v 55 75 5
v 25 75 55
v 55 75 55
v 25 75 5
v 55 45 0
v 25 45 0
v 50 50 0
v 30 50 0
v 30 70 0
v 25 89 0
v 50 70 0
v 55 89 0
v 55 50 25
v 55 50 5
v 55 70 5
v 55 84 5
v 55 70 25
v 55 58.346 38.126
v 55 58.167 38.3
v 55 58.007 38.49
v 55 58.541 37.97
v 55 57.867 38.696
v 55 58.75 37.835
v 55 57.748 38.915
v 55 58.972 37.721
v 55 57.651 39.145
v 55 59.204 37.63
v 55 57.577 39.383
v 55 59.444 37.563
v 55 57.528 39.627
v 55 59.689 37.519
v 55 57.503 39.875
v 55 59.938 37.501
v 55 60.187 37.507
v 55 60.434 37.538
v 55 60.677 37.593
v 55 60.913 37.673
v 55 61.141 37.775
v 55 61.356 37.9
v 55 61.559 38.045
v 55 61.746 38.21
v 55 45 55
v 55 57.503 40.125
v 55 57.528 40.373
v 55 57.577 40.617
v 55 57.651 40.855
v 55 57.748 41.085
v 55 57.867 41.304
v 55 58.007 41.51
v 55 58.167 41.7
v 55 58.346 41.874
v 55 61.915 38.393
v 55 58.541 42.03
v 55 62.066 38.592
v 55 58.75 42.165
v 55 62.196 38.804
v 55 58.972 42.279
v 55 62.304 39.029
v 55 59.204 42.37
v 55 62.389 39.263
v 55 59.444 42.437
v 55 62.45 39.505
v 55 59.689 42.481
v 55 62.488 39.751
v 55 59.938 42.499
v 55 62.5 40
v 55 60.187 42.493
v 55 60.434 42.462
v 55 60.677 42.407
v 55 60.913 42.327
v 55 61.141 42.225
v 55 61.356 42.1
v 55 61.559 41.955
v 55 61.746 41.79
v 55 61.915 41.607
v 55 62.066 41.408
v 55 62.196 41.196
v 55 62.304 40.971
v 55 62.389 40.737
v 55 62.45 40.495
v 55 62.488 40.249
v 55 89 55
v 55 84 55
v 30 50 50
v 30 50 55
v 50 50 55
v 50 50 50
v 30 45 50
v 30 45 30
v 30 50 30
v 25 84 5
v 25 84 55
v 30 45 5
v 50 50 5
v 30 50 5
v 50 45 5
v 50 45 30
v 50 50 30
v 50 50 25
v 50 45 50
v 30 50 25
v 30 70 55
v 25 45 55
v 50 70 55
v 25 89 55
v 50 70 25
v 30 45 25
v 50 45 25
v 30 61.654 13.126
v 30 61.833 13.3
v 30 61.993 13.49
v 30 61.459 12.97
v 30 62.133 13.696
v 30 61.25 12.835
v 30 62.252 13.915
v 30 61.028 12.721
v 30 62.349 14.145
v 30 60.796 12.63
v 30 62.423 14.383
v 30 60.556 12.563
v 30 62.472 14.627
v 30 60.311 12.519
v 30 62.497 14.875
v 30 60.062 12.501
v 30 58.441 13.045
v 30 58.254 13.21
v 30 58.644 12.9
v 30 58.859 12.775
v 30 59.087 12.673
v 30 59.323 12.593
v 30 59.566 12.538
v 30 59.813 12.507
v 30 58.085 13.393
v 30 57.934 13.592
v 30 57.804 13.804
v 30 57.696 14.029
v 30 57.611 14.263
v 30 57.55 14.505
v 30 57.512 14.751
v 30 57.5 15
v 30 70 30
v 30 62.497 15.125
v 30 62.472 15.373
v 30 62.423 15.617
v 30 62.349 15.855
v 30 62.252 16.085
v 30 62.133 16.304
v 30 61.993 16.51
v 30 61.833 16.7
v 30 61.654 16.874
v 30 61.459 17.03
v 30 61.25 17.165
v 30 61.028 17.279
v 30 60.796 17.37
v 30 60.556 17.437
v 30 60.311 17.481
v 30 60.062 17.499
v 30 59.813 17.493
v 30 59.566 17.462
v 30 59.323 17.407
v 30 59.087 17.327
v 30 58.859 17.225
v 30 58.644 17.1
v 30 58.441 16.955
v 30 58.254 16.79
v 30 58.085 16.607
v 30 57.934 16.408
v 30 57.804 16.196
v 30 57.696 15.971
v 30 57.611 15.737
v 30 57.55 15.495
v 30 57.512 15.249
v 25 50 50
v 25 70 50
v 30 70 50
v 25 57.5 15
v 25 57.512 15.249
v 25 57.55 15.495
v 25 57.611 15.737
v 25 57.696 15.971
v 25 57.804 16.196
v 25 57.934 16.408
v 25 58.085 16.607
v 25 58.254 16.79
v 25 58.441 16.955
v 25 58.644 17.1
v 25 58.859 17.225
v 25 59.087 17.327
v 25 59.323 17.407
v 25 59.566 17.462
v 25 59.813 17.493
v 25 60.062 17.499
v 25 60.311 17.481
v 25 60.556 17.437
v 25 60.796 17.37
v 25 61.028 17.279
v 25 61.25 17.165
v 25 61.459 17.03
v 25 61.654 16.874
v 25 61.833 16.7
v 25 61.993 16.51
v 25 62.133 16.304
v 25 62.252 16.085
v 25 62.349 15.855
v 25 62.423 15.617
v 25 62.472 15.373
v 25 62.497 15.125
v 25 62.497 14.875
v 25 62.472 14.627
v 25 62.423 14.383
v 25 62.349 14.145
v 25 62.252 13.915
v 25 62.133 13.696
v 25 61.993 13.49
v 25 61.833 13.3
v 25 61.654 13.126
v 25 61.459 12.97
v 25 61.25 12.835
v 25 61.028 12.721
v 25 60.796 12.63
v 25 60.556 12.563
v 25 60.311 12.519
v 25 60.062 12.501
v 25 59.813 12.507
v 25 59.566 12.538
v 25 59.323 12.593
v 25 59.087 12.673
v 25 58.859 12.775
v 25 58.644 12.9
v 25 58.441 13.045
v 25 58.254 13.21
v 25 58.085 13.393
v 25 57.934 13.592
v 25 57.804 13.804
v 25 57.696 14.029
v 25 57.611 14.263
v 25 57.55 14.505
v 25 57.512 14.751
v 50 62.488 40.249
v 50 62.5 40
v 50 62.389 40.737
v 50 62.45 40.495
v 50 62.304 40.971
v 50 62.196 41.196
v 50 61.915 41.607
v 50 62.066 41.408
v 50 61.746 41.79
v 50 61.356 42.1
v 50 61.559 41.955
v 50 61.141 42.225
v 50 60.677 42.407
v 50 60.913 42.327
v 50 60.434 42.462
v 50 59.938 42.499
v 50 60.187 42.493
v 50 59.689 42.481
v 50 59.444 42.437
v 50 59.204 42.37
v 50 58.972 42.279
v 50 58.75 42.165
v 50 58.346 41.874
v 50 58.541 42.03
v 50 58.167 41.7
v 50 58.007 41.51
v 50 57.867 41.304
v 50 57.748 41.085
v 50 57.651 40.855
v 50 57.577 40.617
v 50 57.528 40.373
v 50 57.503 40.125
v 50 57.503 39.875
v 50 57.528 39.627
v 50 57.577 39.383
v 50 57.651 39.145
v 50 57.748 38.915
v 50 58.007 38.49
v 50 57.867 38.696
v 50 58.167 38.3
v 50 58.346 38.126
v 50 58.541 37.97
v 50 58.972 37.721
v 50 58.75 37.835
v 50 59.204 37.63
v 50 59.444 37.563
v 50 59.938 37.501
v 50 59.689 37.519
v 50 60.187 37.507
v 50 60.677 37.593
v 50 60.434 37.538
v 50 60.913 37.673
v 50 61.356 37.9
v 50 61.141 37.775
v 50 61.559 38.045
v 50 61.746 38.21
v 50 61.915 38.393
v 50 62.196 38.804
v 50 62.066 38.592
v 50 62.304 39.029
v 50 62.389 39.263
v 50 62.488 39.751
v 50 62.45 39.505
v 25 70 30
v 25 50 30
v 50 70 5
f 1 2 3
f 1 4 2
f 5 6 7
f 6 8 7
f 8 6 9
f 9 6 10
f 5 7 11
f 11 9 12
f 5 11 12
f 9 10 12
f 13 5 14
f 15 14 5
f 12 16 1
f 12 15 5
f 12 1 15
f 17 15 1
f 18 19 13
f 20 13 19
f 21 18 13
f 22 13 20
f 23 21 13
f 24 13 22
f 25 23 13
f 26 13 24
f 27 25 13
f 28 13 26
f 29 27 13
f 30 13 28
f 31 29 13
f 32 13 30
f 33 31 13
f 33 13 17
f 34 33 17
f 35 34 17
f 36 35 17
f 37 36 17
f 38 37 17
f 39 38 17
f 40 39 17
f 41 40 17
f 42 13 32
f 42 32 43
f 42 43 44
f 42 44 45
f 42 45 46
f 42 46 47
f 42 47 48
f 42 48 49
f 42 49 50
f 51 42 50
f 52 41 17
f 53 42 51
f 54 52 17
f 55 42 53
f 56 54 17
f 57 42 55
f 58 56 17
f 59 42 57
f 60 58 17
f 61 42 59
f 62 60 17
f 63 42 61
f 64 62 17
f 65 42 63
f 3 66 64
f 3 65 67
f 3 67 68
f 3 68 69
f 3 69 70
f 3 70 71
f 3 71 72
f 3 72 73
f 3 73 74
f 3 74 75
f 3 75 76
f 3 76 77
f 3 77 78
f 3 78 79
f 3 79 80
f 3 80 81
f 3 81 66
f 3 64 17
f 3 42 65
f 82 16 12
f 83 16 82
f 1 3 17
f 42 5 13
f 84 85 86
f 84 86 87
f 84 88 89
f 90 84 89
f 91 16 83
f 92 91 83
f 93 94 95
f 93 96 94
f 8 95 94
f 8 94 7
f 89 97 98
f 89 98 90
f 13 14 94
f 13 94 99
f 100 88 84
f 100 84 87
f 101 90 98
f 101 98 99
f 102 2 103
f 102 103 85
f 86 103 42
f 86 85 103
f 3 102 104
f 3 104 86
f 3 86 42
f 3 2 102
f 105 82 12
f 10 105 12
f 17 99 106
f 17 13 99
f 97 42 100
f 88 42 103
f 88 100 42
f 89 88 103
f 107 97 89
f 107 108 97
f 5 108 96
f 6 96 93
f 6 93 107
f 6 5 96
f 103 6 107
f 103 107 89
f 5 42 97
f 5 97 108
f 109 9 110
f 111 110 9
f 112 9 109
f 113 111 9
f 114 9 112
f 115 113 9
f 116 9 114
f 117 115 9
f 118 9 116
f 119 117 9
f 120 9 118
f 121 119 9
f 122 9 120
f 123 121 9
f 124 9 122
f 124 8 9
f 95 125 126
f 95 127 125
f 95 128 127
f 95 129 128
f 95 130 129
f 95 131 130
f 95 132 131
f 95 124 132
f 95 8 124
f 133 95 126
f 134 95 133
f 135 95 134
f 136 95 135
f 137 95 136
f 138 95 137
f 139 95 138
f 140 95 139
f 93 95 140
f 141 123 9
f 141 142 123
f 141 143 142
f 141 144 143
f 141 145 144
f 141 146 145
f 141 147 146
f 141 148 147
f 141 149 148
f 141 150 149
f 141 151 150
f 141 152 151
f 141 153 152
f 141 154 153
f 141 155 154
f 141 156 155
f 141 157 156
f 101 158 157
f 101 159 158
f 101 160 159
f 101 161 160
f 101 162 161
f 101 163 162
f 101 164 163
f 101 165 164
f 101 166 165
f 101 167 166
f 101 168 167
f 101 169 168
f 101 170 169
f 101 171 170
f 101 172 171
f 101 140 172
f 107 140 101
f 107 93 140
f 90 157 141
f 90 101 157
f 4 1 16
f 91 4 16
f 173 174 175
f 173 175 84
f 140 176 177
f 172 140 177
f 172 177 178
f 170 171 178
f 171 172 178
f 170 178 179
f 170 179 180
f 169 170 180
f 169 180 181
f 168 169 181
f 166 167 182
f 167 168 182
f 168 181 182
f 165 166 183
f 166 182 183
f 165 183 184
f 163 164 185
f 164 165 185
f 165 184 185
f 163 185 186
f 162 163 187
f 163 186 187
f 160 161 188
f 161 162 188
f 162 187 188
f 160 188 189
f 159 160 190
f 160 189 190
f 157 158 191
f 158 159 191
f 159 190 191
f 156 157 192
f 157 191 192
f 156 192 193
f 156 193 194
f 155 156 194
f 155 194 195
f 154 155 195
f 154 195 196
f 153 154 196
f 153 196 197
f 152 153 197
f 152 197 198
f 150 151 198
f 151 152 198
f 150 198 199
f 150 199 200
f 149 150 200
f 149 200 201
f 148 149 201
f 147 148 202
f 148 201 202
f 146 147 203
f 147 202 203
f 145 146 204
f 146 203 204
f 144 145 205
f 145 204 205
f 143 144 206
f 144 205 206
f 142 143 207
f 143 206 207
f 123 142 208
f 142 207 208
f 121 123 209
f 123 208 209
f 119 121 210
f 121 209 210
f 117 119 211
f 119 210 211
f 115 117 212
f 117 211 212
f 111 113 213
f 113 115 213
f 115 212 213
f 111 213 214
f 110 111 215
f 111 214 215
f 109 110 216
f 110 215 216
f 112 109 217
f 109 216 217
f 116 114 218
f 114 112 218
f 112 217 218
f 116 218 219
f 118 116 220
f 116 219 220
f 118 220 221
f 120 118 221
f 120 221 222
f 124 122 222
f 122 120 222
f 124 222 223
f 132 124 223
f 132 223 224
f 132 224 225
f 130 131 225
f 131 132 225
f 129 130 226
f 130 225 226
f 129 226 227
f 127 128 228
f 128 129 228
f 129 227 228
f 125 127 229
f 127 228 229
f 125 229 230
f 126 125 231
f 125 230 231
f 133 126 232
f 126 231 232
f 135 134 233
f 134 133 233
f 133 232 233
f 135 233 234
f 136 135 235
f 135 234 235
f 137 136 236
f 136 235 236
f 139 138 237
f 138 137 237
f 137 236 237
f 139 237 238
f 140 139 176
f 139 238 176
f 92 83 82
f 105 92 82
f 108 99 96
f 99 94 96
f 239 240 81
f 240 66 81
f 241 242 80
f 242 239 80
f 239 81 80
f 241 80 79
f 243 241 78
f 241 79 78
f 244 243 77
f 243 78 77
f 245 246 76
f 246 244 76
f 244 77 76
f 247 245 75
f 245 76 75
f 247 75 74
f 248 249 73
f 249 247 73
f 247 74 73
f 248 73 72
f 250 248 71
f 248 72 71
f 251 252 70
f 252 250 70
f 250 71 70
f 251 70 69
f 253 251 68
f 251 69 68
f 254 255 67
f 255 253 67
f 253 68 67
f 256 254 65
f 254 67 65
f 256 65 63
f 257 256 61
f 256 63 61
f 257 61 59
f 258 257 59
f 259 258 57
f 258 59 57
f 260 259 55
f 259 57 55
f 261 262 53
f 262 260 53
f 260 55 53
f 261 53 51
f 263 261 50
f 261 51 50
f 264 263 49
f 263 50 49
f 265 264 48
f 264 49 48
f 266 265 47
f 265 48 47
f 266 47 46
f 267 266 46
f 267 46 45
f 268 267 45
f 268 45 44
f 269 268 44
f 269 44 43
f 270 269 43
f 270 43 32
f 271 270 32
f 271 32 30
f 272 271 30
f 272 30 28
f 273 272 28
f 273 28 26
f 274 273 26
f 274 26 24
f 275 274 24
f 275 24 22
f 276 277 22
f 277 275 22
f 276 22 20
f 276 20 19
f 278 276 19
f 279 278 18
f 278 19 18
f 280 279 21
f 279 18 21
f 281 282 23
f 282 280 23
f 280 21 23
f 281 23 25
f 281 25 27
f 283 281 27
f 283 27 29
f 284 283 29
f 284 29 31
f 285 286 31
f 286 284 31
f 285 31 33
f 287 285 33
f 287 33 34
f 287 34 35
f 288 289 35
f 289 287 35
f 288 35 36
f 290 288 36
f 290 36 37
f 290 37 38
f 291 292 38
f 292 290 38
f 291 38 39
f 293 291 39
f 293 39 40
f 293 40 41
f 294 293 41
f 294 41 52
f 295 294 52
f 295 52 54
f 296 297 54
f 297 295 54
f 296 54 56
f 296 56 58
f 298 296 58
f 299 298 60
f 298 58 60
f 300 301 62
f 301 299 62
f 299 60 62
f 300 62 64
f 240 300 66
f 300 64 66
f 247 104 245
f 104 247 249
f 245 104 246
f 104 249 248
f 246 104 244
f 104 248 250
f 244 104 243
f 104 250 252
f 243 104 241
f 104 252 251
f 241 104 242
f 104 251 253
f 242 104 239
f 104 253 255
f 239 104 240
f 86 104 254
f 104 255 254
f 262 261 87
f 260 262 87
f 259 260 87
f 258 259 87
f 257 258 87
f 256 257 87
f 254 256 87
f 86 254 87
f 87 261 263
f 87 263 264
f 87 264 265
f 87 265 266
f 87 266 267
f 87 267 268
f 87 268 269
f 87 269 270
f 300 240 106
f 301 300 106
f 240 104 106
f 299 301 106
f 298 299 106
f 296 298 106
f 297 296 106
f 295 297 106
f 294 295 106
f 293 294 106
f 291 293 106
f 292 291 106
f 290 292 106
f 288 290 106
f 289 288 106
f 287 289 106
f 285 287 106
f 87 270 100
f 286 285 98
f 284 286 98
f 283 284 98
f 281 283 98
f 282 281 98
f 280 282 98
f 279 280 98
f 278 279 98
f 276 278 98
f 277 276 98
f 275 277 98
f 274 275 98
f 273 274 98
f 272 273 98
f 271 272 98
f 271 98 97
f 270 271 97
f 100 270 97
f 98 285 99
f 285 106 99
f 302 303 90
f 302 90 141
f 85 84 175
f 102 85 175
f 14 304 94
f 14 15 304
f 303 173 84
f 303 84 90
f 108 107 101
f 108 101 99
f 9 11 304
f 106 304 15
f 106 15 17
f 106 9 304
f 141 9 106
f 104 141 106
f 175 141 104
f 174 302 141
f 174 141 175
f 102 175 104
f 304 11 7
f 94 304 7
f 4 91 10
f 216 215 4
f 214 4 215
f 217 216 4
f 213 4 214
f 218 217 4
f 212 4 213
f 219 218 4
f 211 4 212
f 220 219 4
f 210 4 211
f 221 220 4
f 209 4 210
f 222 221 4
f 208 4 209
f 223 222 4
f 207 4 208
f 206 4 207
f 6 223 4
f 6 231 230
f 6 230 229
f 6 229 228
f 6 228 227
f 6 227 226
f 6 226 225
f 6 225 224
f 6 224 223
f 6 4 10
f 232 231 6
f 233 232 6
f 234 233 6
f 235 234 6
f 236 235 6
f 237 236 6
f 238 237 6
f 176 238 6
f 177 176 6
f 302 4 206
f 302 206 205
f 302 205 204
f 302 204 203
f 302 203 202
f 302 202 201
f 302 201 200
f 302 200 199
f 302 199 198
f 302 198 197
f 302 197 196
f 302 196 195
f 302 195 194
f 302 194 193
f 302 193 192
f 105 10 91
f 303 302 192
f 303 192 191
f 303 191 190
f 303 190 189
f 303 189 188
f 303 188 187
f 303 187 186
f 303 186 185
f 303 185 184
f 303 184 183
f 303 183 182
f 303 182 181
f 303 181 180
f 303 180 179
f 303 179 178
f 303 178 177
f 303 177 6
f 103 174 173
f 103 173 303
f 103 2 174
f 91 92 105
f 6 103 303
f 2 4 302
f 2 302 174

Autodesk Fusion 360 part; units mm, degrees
sketch "Sketch1" plane through (0, 0, 0) normal (0, 0, 1) x (1, 0, 0)
  line L0 (25, 75) -> (55, 75)
  line L1 (55, 75) -> (55, 45)
  line L2 (55, 45) -> (25, 45)
  line L3 (25, 45) -> (25, 75)
  dimension "d1" = 30
  dimension "d2" = 30
extrude "Extrude1" add sketch "Sketch1" along normal blind 55
sketch "Sketch2" plane through (0, 0, 0) normal (0, 0, 1) x (1, 0, 0)
  line L0 (25, 75) -> (25, 70)
  line L1 (25, 70) -> (50, 70)
  line L2 (50, 70) -> (50, 50)
  line L3 (50, 50) -> (30, 50)
  line L4 (30, 50) -> (30, 70)
  dimension "d5" = 5
  dimension "d6" = 25
  dimension "d7" = 20
  dimension "d8" = 20
extrude "Extrude2" cut sketch "Sketch2" along normal blind 55
sketch "Sketch3" plane through (25, 0, 0) normal (-1, 0, 0) x (0, -1, 0)
  line L0 (-75, 0) -> (-45, 0)
  line L1 (-45, 0) -> (-45, 55)
  line L2 (-45, 55) -> (-75, 55)
  line L3 (-75, 55) -> (-75, 0)
  line L4 (-70, 50) -> (-50, 50)
  line L5 (-50, 50) -> (-50, 30)
  line L6 (-50, 30) -> (-70, 30)
  line L7 (-70, 30) -> (-70, 50)
  line L8 (-70, 25) -> (-50, 25)
  line L9 (-50, 25) -> (-50, 5)
  line L10 (-50, 5) -> (-70, 5)
  line L11 (-70, 5) -> (-70, 25)
extrude "Extrude3" cut sketch "Sketch3" against normal blind 6 contours L4 L5 L6 L7 | L8 L9 L10 L11
sketch "Sketch4" plane through (0, 45, 0) normal (0, -1, 0) x (1, 0, 0)
  line L0 (25, 0) -> (55, 0)
  line L1 (55, 0) -> (55, 55)
  line L2 (55, 55) -> (25, 55)
  line L3 (25, 55) -> (25, 0)
  line L4 (30, 50) -> (50, 50)
  line L5 (50, 50) -> (50, 30)
  line L6 (50, 30) -> (30, 30)
  line L7 (30, 50) -> (30, 30)
  line L8 (30, 25) -> (50, 25)
  line L9 (50, 25) -> (50, 5)
  line L10 (50, 5) -> (30, 5)
  line L11 (30, 5) -> (30, 25)
extrude "Extrude4" cut sketch "Sketch4" against normal blind 5 contours L4 L5 L6 L7 | L8 L9 L10 L11
sketch "Sketch5" plane through (55, 0, 0) normal (1, 0, 0) x (0, 1, 0)
  line L0 (45, 0) -> (75, 0)
  line L1 (75, 0) -> (75, 55)
  line L2 (75, 55) -> (45, 55)
  line L3 (45, 55) -> (45, 0)
  line L4 (50, 50) -> (70, 50)
  line L5 (70, 50) -> (70, 30)
  line L6 (70, 30) -> (50, 30)
  line L7 (50, 30) -> (50, 50)
  line L8 (50, 25) -> (70, 25)
  line L9 (70, 25) -> (70, 5)
  line L10 (70, 5) -> (50, 5)
  line L11 (50, 5) -> (50, 25)
extrude "Extrude5" cut sketch "Sketch5" against normal blind 5 contours L4 L5 L6 L7 | L8 L9 L10 L11
sketch "Sketch6" plane through (0, 0, 0) normal (0, 0, -1) x (1, 0, 0)
  line L0 (30, -70) -> (30, -50)
  line L1 (30, -50) -> (50, -50)
  line L2 (50, -50) -> (50, -70)
  line L3 (50, -70) -> (30, -70)
  line L4 (55, -45) -> (25, -45)
  line L5 (25, -45) -> (25, -75)
  line L6 (25, -75) -> (55, -75)
  line L7 (55, -75) -> (55, -45)
sketch "Sketch7" plane through (55, 0, 0) normal (1, 0, 0) x (0, 1, 0)
  line L0 (70, 50) -> (70, 30)
  line L1 (70, 30) -> (50, 30)
  line L2 (50, 30) -> (50, 50)
  line L3 (50, 50) -> (70, 50)
  line L4 (70, 25) -> (70, 5)
  line L5 (70, 5) -> (50, 5)
  line L6 (50, 5) -> (50, 25)
  line L7 (50, 25) -> (70, 25)
  line L8 (45, 0) -> (75, 0)
  line L9 (75, 0) -> (75, 55)
  line L10 (75, 55) -> (45, 55)
  line L11 (45, 55) -> (45, 0)
  line L12 (75, 0) -> (84, 0)
  line L13 (84, 0) -> (89, 0)
  line L14 (84, 0) -> (84, 55)
  line L15 (84, 55) -> (89, 55)
  line L16 (89, 55) -> (89, 0)
  line L17 (75, 0) -> (75, 5)
  line L18 (75, 5) -> (84, 5)
  dimension "d17" = 9
  dimension "d18" = 5
  dimension "d19" = 5
extrude "Extrude6" add sketch "Sketch7" against normal blind 30 contours L9 L12 L14 L17 L18 | L13 L14 L15 L16
sketch "Sketch8" plane through (0, 0, 0) normal (1, 0, 0) x (0, 1, 0)
sketch "Sketch9" plane through (25, 0, 0) normal (-1, 0, 0) x (0, -1, 0)
  line L0 (-50, 50) -> (-50, 30)
  line L1 (-50, 30) -> (-70, 30)
  line L2 (-70, 30) -> (-70, 50)
  line L3 (-70, 50) -> (-50, 50)
  line L4 (-50, 25) -> (-50, 5)
  line L5 (-50, 5) -> (-70, 5)
  line L6 (-70, 5) -> (-70, 25)
  line L7 (-70, 25) -> (-50, 25)
  line L8 (-89, 0) -> (-45, 0)
  line L9 (-45, 0) -> (-45, 55)
  line L10 (-45, 55) -> (-75, 55)
  line L11 (-75, 55) -> (-75, 5)
  line L12 (-75, 5) -> (-84, 5)
  line L13 (-84, 5) -> (-84, 55)
  line L14 (-84, 55) -> (-89, 55)
  line L15 (-89, 55) -> (-89, 0)
  line L16 (-50, 5) -> (-70, 5)
  line L17 (-70, 5) -> (-70, 25)
  line L18 (-70, 25) -> (-50, 25)
  line L19 (-50, 25) -> (-50, 5)
extrude "Extrude7" add sketch "Sketch9" against normal blind 5 contours L4 L5 L6 L7 L16 L17 L18 L19
sketch "Sketch10" plane through (25, 0, 0) normal (-1, 0, 0) x (0, -1, 0)
  line L0 (-50, 50) -> (-50, 30)
  line L1 (-50, 30) -> (-70, 30)
  line L2 (-70, 30) -> (-70, 50)
  line L3 (-70, 50) -> (-50, 50)
  line L4 (-89, 0) -> (-45, 0)
  line L5 (-45, 0) -> (-45, 55)
  line L6 (-45, 55) -> (-75, 55)
  line L7 (-75, 55) -> (-75, 5)
  line L8 (-75, 5) -> (-84, 5)
  line L9 (-84, 5) -> (-84, 55)
  line L10 (-84, 55) -> (-89, 55)
  line L11 (-89, 55) -> (-89, 0)
  line L12 (-60, 0) -> (-60, 15)
  circle A0 centre (-60, 15) radius 2.5
  dimension "d24" = 5
extrude "Extrude8" cut sketch "Sketch10" against normal blind 5 contours A0
sketch "Sketch11" plane through (55, 0, 0) normal (1, 0, 0) x (0, 1, 0)
  line L0 (70, 50) -> (70, 30)
  line L1 (70, 30) -> (50, 30)
  line L2 (50, 30) -> (50, 50)
  line L3 (50, 50) -> (70, 50)
  line L4 (70, 25) -> (70, 5)
  line L5 (70, 5) -> (50, 5)
  line L6 (50, 5) -> (50, 25)
  line L7 (50, 25) -> (70, 25)
  line L8 (45, 0) -> (89, 0)
  line L9 (89, 0) -> (89, 55)
  line L10 (89, 55) -> (84, 55)
  line L11 (84, 55) -> (84, 5)
  line L12 (84, 5) -> (75, 5)
  line L13 (75, 5) -> (75, 55)
  line L14 (75, 55) -> (45, 55)
  line L15 (45, 55) -> (45, 0)
  line L16 (70, 30) -> (50, 30)
  line L17 (50, 30) -> (50, 50)
  line L18 (50, 50) -> (70, 50)
  line L19 (70, 50) -> (70, 30)
extrude "Extrude9" add sketch "Sketch11" against normal blind 5 contours L0 L1 L2 L3 L16 L17 L18 L19
sketch "Sketch12" plane through (55, 0, 0) normal (1, 0, 0) x (0, 1, 0)
  line L0 (70, 25) -> (70, 5)
  line L1 (70, 5) -> (50, 5)
  line L2 (50, 5) -> (50, 25)
  line L3 (50, 25) -> (70, 25)
  line L4 (45, 0) -> (89, 0)
  line L5 (89, 0) -> (89, 55)
  line L6 (89, 55) -> (84, 55)
  line L7 (84, 55) -> (84, 5)
  line L8 (84, 5) -> (75, 5)
  line L9 (75, 5) -> (75, 55)
  line L10 (75, 55) -> (45, 55)
  line L11 (45, 55) -> (45, 0)
  line L12 (60, 55) -> (60, 40)
  circle A0 centre (60, 40) radius 2.5
  dimension "d29" = 5
extrude "Extrude10" cut sketch "Sketch12" against normal blind 5 contours A0
